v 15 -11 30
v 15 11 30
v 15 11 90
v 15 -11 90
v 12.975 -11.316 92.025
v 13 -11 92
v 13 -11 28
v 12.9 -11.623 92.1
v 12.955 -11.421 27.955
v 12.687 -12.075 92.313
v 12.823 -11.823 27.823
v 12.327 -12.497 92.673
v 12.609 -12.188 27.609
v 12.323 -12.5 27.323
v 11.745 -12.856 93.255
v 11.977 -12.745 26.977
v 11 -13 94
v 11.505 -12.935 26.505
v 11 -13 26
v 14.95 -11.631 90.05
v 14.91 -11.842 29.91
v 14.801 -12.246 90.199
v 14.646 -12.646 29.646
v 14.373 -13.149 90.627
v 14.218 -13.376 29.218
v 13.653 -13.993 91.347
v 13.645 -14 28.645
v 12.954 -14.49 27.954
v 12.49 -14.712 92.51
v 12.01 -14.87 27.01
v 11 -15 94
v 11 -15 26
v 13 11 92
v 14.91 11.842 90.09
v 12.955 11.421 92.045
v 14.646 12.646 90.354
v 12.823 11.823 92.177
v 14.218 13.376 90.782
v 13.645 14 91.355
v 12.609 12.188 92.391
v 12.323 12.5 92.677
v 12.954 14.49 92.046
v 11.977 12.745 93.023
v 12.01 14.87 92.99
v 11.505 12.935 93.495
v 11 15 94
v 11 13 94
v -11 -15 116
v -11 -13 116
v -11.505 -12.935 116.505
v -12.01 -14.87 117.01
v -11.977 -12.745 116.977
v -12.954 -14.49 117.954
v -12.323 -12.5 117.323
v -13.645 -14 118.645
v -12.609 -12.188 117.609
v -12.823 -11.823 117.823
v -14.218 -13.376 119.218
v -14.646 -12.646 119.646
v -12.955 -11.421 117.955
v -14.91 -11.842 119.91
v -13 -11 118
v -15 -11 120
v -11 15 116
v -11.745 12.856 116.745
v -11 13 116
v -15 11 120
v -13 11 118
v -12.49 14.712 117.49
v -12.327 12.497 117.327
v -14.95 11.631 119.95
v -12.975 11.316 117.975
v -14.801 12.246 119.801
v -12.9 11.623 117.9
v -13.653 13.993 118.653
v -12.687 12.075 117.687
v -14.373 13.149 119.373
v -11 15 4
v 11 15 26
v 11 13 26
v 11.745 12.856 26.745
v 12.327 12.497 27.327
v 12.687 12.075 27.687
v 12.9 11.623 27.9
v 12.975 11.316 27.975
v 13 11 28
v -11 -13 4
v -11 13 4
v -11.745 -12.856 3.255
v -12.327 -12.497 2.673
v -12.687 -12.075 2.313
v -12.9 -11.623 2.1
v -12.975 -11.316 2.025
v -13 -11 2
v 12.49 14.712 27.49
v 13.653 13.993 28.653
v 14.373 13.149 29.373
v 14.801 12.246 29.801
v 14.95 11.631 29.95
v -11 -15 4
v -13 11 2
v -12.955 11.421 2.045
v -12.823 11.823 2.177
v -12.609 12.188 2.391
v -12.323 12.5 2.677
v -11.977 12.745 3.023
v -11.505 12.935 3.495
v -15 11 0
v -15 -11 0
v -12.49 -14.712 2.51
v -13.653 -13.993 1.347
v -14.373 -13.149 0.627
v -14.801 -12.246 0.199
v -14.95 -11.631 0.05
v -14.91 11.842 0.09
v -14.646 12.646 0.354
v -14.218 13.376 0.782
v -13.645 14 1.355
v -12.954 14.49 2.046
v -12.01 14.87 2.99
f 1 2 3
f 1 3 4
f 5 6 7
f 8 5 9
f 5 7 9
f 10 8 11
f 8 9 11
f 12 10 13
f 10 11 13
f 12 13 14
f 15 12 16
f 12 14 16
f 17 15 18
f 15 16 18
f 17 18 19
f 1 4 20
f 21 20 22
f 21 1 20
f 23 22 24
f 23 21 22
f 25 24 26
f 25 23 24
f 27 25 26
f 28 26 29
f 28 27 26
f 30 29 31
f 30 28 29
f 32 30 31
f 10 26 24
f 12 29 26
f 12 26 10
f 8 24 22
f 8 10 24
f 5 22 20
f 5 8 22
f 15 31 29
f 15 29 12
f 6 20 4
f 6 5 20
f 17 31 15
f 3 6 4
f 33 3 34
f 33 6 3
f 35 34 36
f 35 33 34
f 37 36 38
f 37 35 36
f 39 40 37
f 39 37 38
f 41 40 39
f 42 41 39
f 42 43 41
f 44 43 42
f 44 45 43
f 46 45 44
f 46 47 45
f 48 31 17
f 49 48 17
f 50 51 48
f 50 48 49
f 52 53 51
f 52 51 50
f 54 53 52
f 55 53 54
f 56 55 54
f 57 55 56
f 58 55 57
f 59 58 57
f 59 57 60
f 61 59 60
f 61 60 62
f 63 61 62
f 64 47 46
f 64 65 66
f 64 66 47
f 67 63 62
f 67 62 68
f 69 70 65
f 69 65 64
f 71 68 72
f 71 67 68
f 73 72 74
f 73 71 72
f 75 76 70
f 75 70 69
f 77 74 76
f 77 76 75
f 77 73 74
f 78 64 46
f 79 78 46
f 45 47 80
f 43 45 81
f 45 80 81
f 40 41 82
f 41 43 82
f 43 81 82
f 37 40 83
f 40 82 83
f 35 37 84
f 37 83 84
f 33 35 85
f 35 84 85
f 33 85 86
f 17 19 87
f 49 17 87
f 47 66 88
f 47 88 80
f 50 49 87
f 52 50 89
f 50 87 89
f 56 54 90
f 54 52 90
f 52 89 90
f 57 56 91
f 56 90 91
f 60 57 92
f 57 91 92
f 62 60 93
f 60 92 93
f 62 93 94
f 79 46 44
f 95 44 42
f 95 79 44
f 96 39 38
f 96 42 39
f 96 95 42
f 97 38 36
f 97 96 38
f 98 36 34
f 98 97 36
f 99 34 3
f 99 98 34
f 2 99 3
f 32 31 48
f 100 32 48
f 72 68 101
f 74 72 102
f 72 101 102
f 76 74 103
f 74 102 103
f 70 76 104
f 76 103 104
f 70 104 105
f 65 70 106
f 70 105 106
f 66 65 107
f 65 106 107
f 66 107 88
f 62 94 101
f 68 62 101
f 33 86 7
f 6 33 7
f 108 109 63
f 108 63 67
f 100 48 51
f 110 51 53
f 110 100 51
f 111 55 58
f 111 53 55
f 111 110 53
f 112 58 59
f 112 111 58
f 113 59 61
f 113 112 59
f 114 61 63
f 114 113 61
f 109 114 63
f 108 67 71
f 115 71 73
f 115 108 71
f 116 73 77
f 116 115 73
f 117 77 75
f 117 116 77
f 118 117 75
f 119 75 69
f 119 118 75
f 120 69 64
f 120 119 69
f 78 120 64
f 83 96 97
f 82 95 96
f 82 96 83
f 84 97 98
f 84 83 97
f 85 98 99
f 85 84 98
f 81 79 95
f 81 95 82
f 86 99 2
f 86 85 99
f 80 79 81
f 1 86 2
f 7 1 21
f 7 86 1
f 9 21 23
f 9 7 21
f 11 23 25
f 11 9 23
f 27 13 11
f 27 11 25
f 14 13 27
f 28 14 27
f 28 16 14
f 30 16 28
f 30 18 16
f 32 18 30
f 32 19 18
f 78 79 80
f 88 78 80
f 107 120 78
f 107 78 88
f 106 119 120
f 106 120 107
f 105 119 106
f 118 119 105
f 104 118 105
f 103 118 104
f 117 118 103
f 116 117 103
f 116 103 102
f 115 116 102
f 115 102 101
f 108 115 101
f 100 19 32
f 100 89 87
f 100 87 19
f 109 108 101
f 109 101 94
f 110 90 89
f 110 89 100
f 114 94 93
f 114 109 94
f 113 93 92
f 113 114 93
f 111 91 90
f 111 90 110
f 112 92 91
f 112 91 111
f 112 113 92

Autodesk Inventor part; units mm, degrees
ref_plane "Plano inicial" through (0, 0, 0) normal (0, 0, 1) x (1, 0, 0)
ref_plane "Plano final" through (0, 0, 120) normal (0, 0, 1) x (1, 0, 0)
sketch "Esboço" plane through (0, 0, 0) normal (0, 0, 1) x (1, 0, 0)
  line L0 (-15, -11) -> (-15, 11)
  line L1 (-11, 15) -> (11, 15)
  line L2 (15, 11) -> (15, -11)
  line L3 (11, -15) -> (-11, -15)
  arc A0 (-15, -11) -> (-11, -15) centre (-11, -11) ccw
  arc A1 (15, 11) -> (11, 15) centre (11, 11) ccw
  arc A2 (-11, 15) -> (-15, 11) centre (-11, 11) ccw
  arc A3 (11, -15) -> (15, -11) centre (11, -11) ccw
  arc A4 (-11, 13) -> (-13, 11) centre (-11, 11) ccw
  line L4 (-11, 13) -> (11, 13)
  arc A5 (13, 11) -> (11, 13) centre (11, 11) ccw
  line L5 (13, 11) -> (13, -11)
  arc A6 (11, -13) -> (13, -11) centre (11, -11) ccw
  line L6 (11, -13) -> (-11, -13)
  arc A7 (-13, -11) -> (-11, -13) centre (-11, -11) ccw
  line L7 (-13, -11) -> (-13, 11)
  line L8 (0, 22.1598) -> (0, -22.1598) construction
  line L9 (-22.1598, 0) -> (22.1598, 0) construction
  dimension "d7" = 4
  dimension "d9" = 30
  dimension "d11" = 30
  dimension "d12" = 2
  dimension "d15" = 15
  dimension "d16" = 15
extrude "Corpo" add sketch "Esboço" along normal up to surface (120 mm away) from surface at 0
sketch "Sketch3" plane through (0, 0, 0) normal (0, 0, 1) x (1, 0, 0)
  line L0 (0, 0) -> (10, 0)
ref_plane "Work Plane3" through (0, 0, 0) normal (0, -1, 0) x (1, 0, 0)
sketch "Sketch4" plane through (0, 0, 0) normal (0, -1, 0) x (1, 0, 0)
  line L0 (-2, 0) -> (12, 0)
  line L1 (-2, 120) -> (12, 120)
  dimension "d18" = 120
ref_plane "Plano de trabalho4" through (-15, 0, 0) normal (0.7071, 0, -0.7071) x (-0.7071, 0, -0.7071)
split "Dividir1" plane through (-15, 0, 0) removes the side toward (0.7071, 0, -0.7071)
ref_plane "Plano de trabalho5" through (-15, 0, 120) normal (0.7071, 0, 0.7071) x (0.7071, 0, -0.7071)
split "Dividir2" plane through (-15, 0, 120) removes the side toward (0.7071, 0, 0.7071)
equation "\"d7\" = G_IR"
equation "\"d9\" = G_W"
equation "\"d11\" = G_H"
equation "\"d12\" = G_T"
equation "\"d15\" = 0.5 * d9"
equation "\"d16\" = 0.5 * d11"
equation "\"d3\" = G_L"
equation "\"G_W\" = 30"
equation "\"G_H\" = 30"
equation "\"G_T\" = 2"
equation "\"G_IR\" = 4"
equation "\"G_L\" = d18"
equation "\"G_OFFSET_START\" = 0"
equation "\"G_OFFSET_END\" = 0"
properties part number "ISO 10799-2 - 30x30x2 - 120" material "Aço, suave"
